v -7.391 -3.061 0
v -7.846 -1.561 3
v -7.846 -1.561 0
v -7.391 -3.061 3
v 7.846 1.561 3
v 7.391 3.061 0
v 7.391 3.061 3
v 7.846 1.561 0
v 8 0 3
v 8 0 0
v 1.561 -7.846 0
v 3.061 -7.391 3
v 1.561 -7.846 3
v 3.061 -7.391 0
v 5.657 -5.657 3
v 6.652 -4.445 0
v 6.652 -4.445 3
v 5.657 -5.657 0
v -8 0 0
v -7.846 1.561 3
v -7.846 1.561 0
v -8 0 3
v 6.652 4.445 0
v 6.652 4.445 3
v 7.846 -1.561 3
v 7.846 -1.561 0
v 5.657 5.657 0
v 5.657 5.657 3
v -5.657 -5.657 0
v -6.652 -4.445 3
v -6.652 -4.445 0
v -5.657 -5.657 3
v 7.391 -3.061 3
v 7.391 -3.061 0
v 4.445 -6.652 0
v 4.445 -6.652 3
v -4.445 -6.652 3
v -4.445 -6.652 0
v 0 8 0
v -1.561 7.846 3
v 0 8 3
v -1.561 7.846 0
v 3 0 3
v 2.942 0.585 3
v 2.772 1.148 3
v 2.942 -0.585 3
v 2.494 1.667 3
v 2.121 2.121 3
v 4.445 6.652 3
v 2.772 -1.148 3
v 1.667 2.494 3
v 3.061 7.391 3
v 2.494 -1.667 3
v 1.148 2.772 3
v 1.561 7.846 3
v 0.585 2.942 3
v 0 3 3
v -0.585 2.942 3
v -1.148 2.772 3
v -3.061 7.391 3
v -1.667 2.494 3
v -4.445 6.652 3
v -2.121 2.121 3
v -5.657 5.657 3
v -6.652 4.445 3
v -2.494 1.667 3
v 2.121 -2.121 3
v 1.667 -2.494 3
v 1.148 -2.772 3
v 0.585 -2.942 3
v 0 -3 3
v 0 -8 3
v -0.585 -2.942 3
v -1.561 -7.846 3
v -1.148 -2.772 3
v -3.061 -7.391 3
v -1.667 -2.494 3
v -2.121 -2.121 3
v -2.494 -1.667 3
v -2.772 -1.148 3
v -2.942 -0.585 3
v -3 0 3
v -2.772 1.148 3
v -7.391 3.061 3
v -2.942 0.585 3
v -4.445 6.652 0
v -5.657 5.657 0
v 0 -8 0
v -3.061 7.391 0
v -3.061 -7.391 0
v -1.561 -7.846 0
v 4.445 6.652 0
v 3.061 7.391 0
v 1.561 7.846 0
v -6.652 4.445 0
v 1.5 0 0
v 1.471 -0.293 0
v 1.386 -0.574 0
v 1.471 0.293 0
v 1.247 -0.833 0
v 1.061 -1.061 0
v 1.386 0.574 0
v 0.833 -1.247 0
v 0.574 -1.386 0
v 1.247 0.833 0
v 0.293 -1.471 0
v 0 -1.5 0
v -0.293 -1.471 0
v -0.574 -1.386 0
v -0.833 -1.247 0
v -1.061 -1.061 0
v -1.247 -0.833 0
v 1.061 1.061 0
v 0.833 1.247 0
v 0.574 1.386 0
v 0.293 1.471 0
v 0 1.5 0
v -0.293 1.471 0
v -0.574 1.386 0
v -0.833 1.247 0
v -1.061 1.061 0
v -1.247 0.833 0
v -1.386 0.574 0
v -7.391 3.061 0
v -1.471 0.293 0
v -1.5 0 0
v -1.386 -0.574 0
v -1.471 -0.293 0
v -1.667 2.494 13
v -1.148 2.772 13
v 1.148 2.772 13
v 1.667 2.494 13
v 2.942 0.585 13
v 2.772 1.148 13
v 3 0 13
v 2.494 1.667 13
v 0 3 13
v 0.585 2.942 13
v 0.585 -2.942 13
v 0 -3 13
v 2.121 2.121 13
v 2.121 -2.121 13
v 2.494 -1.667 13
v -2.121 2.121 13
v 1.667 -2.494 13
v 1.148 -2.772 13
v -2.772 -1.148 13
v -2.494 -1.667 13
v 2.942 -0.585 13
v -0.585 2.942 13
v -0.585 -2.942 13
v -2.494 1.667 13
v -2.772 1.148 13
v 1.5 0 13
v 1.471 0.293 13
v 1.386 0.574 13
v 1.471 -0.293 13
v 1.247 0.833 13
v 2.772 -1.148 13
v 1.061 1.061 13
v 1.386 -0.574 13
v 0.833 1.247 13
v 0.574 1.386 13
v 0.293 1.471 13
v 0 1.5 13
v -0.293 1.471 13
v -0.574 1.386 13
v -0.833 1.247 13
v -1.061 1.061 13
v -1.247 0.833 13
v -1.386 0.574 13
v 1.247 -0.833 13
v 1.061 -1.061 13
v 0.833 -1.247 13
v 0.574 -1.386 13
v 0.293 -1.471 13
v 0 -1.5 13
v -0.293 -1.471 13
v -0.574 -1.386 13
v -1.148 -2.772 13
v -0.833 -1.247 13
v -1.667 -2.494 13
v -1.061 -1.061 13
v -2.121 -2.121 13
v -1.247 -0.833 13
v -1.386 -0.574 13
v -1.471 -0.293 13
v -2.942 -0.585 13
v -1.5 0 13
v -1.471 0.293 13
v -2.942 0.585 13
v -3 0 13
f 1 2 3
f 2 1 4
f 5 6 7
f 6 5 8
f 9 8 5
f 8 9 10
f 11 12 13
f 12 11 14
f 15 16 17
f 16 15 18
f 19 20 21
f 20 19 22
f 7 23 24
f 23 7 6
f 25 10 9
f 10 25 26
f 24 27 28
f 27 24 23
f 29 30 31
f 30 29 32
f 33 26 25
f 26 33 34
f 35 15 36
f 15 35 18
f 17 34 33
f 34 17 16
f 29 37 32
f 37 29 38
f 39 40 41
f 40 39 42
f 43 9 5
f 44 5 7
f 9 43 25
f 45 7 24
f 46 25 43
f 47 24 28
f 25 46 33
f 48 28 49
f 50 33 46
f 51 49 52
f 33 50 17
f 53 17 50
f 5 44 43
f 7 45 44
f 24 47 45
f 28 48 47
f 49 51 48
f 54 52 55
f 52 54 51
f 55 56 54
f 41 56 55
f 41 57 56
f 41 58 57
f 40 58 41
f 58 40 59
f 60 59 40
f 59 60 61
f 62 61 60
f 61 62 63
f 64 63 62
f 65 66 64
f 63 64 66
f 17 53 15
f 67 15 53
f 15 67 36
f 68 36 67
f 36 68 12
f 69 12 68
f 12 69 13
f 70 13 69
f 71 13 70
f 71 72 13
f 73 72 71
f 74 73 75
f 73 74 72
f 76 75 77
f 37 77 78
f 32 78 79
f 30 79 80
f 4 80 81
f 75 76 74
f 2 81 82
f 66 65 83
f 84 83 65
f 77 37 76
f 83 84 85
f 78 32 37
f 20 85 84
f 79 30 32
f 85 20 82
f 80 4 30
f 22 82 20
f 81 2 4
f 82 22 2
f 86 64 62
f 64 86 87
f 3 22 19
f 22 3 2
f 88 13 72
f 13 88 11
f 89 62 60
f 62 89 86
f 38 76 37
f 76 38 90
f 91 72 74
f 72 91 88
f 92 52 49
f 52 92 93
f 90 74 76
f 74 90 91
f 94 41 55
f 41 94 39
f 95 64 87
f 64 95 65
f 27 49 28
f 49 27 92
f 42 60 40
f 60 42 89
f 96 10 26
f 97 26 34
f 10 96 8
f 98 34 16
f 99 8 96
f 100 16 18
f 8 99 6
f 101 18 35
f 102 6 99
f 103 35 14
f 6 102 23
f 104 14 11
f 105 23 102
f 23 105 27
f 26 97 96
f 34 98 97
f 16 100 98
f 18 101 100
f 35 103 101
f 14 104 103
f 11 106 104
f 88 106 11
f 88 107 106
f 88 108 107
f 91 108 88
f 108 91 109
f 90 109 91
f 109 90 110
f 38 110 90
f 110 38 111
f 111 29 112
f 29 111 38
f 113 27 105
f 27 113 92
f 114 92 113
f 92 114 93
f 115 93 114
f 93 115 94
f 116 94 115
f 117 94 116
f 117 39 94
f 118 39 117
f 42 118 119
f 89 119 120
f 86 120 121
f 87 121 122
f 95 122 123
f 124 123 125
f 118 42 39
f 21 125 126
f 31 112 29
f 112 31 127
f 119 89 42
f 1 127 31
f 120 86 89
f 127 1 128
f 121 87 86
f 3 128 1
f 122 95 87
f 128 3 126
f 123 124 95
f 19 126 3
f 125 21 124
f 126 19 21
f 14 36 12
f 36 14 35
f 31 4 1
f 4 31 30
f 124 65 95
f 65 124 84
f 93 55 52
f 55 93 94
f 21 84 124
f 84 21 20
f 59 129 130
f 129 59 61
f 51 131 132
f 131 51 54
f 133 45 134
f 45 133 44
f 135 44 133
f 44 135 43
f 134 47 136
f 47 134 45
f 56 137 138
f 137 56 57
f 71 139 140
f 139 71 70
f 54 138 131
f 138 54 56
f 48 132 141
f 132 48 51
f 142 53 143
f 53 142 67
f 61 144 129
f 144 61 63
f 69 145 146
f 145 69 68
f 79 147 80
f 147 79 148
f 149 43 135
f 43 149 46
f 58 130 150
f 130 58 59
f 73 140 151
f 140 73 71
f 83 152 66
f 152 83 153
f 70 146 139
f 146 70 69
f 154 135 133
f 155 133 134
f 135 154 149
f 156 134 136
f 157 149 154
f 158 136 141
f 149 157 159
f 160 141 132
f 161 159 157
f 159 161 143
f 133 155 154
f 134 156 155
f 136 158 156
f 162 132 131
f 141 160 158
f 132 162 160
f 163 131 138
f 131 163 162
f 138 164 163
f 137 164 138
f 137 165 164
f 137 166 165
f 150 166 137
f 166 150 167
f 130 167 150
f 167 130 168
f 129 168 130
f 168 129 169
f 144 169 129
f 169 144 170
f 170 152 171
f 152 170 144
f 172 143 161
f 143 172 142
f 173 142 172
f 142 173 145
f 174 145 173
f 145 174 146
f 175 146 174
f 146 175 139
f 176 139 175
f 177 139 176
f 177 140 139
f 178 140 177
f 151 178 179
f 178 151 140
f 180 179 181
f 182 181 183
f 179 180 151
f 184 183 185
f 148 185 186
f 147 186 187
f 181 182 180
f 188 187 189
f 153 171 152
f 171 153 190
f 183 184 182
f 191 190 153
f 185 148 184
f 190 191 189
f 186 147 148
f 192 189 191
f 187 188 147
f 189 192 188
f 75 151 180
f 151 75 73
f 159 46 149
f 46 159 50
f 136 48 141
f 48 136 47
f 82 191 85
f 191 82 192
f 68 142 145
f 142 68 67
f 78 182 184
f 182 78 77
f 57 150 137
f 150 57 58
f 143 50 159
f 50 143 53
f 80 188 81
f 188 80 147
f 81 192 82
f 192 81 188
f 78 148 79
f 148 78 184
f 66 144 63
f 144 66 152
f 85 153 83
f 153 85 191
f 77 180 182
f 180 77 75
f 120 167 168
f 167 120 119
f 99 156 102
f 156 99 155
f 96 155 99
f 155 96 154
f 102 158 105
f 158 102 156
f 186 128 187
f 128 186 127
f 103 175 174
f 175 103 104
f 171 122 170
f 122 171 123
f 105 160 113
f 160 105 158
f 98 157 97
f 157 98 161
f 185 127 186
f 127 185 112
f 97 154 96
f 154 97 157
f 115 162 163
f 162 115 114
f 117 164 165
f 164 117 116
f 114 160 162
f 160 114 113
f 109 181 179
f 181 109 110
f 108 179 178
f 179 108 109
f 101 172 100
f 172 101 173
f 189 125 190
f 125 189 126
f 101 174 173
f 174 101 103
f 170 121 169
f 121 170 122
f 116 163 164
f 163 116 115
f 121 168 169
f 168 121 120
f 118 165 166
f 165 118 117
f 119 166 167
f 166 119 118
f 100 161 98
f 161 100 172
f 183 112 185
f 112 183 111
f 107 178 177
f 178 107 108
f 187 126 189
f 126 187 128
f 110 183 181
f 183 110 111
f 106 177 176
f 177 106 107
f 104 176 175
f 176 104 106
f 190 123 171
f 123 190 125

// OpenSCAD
$fn = 32;

// ----------------------------------------------------------------------
// Micro post: flanged post, 5-20 mm class
// ----------------------------------------------------------------------

// --- parameters (mm) ---
post_d = 6;               // post diameter
post_h = 10;              // post height above the flange
flange_d = 16;            // flange diameter
flange_t = 3;             // flange thickness
bore_d = 3;               // through bore

total_h = post_h + flange_t;  // overall height

difference() {
  union() {
    cylinder(h = flange_t, d = flange_d);
    translate([0, 0, flange_t]) cylinder(h = post_h, d = post_d);
  }
  translate([0, 0, -1]) cylinder(h = total_h + 2, d = bore_d);
}
